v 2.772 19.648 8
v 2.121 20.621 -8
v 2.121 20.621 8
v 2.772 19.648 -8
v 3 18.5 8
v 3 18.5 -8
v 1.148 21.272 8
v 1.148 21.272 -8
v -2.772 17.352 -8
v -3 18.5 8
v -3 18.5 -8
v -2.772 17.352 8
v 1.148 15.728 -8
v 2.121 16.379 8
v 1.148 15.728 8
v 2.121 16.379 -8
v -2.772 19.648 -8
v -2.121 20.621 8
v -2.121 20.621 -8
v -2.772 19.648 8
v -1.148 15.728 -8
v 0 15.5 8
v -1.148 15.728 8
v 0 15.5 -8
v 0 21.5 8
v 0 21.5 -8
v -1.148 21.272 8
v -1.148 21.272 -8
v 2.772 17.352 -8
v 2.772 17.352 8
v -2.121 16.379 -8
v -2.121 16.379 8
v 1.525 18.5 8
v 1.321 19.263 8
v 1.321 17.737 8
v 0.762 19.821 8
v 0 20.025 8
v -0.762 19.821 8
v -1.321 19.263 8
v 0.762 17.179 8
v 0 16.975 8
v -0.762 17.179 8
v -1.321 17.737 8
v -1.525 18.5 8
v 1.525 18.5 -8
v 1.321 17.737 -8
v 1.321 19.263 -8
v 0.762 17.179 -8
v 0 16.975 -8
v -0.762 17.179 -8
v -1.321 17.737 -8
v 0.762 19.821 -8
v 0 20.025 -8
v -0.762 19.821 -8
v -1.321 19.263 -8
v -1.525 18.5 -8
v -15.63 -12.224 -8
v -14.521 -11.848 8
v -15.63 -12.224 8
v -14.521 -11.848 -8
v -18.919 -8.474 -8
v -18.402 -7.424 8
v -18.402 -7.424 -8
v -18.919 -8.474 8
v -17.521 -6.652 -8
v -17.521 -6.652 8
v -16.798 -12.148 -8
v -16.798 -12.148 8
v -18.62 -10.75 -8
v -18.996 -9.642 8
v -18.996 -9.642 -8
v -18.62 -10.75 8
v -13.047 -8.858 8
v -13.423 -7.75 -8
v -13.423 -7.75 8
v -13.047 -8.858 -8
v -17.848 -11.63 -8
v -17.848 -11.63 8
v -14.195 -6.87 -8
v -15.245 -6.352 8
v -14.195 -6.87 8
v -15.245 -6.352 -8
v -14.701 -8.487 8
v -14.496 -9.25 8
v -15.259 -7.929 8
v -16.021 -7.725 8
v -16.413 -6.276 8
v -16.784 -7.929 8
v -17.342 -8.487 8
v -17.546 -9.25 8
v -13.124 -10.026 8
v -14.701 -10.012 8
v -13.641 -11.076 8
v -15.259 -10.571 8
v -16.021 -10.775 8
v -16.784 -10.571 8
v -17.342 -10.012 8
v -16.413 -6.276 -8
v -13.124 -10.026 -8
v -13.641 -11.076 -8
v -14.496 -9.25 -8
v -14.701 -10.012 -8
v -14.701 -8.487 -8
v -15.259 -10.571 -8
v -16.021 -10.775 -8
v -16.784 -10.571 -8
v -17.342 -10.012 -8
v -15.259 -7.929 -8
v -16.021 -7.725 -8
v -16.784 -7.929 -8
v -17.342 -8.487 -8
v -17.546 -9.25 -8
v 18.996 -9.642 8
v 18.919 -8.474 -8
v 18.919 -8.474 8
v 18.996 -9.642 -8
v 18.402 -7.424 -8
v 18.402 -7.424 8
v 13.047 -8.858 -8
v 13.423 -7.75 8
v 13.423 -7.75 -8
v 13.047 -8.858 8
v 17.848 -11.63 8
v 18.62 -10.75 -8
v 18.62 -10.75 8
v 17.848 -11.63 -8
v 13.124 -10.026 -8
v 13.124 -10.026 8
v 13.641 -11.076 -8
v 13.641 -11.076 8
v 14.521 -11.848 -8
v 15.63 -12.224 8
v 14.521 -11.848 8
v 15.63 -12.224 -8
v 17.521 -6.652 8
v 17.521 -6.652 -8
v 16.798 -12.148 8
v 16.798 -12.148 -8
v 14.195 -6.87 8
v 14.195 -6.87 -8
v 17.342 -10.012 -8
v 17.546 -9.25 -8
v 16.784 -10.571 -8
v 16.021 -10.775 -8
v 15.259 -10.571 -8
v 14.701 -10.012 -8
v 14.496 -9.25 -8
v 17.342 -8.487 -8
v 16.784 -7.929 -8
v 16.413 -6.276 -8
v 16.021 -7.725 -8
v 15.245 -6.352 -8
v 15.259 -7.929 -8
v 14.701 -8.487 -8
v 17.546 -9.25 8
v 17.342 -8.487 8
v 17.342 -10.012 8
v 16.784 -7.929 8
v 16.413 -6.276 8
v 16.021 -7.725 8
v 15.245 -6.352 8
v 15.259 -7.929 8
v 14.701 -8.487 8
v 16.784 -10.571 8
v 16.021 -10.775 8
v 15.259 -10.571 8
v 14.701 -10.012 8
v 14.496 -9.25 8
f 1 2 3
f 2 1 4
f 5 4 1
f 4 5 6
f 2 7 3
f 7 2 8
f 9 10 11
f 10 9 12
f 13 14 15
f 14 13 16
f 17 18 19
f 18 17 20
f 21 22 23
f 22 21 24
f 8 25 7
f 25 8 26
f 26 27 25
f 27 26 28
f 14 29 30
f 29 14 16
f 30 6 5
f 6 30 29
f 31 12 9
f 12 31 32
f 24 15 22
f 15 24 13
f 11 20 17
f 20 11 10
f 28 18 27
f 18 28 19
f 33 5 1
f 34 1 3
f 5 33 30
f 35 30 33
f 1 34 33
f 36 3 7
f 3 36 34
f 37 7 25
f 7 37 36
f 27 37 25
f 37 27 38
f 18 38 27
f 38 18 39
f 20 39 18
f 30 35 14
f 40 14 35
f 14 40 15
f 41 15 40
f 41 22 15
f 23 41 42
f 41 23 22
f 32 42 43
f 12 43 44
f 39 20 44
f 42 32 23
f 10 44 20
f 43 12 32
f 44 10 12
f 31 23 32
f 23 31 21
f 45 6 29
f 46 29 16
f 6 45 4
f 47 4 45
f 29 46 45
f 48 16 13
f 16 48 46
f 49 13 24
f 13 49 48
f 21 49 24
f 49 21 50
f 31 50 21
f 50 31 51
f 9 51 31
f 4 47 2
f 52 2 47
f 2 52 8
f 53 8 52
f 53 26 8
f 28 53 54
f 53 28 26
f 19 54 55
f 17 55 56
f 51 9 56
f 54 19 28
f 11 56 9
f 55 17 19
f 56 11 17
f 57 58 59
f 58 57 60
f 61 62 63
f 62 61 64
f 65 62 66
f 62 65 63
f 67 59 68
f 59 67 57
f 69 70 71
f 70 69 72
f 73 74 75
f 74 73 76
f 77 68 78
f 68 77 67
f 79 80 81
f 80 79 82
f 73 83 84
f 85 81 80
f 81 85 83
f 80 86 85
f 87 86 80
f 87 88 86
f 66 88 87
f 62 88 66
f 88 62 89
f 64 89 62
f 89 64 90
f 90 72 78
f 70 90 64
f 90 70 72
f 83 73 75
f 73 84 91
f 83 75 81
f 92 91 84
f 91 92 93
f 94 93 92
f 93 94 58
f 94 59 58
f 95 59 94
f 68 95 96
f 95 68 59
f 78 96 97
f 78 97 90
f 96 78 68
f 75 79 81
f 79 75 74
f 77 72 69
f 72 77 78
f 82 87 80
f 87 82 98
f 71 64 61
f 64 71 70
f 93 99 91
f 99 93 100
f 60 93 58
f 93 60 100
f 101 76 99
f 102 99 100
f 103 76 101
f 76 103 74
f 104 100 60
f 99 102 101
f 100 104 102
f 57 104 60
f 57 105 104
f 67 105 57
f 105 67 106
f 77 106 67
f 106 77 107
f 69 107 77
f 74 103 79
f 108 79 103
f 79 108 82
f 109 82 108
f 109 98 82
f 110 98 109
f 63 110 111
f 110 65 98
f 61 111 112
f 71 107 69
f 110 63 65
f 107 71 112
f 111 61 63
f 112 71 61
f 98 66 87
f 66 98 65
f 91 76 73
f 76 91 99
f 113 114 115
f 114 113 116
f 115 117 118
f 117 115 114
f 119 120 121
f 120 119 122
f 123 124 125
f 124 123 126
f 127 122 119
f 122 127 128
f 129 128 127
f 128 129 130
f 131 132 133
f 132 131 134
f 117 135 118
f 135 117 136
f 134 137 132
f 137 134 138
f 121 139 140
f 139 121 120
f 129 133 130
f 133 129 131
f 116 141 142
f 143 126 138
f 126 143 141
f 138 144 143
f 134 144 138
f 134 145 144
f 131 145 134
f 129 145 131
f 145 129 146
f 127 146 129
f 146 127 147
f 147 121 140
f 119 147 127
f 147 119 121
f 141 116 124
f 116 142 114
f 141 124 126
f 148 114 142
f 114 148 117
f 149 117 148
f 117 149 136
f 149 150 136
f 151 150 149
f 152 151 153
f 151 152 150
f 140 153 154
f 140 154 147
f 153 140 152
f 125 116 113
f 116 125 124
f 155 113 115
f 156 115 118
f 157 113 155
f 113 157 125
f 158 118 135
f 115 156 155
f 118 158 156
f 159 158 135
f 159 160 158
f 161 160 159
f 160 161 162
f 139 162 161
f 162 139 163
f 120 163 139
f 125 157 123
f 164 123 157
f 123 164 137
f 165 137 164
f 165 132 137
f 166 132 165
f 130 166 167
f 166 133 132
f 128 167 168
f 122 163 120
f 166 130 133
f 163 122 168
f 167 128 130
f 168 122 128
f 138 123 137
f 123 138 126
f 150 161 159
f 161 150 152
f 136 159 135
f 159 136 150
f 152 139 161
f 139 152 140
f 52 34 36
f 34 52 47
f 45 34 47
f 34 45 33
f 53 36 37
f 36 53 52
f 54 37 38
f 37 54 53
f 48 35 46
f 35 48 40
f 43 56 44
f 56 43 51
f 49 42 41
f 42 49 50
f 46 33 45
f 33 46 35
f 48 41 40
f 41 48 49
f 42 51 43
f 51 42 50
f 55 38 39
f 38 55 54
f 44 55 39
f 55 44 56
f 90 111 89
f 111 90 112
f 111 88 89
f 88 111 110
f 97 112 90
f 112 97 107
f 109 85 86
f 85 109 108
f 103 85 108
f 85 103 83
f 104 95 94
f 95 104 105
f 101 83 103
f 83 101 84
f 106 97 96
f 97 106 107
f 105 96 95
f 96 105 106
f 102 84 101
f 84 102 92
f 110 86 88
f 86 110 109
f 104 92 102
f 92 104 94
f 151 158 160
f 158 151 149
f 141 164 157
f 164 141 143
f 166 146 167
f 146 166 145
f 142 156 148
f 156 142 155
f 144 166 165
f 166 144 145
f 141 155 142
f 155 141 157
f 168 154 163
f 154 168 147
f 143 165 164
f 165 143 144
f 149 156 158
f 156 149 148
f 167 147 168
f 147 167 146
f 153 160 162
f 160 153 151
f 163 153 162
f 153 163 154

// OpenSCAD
// file: configuration.scad
// Increase this if your slicer or printer make holes too tight.
extra_radius = 0.1;

// OD = outside diameter, corner to corner.
m3_nut_od = 6.1;
m3_nut_radius = m3_nut_od/2 + 0.2 + extra_radius;

// Major diameter of metric 3mm thread.
m3_major = 2.85;
m3_radius = m3_major/2 + extra_radius;
m3_wide_radius = m3_major/2 + extra_radius + 0.2;

// NEMA17 stepper motors.
motor_shaft_diameter = 5;
motor_shaft_radius = motor_shaft_diameter/2 + extra_radius;

// Frame brackets. M3x8mm screws work best with 3.6 mm brackets.
thickness = 3.6;

// OpenBeam or Misumi. Currently only 15x15 mm, but there is a plan
// to make models more parametric and allow 20x20 mm in the future.
extrusion = 15;
// main file
include <configuration.scad>;

separation = 44;  // Distance between ball joint mounting faces.
offset = 22;  // Same as DELTA_EFFECTOR_OFFSET in Marlin.
mount_radius = 18.5;  // Hotend mounting screws, standard would be 25mm.
jhead_od_radius = 8;  // Hole for the hotend (J-Head diameter is 16mm).
jhead_id_radius = 6;
height = 6;
jhead_height=5;
mount_height=16;



  difference() {
    union() {

		for (a = [0:120:359]) rotate([0, 0, a]) {
           translate([0, mount_radius,0])cylinder(r=3, h=mount_height, center=true, $fn=16);
    		  //translate([0, mount_radius,0])cylinder(r1=3,r2=2, h=mount_height, center=true, $fn=16);
    		  //translate([0, mount_radius,mount_height / 2])cylinder(r1=2,r2=3, h=mount_height/2, center=true, $fn=16);
		}
		
    }

    for (a = [0:30:359]) rotate([0, 0, a]) {
      translate([0, mount_radius, 0])	cylinder(r=m3_radius, h=2*mount_height+height, center=true, $fn=12);
    }

  }
